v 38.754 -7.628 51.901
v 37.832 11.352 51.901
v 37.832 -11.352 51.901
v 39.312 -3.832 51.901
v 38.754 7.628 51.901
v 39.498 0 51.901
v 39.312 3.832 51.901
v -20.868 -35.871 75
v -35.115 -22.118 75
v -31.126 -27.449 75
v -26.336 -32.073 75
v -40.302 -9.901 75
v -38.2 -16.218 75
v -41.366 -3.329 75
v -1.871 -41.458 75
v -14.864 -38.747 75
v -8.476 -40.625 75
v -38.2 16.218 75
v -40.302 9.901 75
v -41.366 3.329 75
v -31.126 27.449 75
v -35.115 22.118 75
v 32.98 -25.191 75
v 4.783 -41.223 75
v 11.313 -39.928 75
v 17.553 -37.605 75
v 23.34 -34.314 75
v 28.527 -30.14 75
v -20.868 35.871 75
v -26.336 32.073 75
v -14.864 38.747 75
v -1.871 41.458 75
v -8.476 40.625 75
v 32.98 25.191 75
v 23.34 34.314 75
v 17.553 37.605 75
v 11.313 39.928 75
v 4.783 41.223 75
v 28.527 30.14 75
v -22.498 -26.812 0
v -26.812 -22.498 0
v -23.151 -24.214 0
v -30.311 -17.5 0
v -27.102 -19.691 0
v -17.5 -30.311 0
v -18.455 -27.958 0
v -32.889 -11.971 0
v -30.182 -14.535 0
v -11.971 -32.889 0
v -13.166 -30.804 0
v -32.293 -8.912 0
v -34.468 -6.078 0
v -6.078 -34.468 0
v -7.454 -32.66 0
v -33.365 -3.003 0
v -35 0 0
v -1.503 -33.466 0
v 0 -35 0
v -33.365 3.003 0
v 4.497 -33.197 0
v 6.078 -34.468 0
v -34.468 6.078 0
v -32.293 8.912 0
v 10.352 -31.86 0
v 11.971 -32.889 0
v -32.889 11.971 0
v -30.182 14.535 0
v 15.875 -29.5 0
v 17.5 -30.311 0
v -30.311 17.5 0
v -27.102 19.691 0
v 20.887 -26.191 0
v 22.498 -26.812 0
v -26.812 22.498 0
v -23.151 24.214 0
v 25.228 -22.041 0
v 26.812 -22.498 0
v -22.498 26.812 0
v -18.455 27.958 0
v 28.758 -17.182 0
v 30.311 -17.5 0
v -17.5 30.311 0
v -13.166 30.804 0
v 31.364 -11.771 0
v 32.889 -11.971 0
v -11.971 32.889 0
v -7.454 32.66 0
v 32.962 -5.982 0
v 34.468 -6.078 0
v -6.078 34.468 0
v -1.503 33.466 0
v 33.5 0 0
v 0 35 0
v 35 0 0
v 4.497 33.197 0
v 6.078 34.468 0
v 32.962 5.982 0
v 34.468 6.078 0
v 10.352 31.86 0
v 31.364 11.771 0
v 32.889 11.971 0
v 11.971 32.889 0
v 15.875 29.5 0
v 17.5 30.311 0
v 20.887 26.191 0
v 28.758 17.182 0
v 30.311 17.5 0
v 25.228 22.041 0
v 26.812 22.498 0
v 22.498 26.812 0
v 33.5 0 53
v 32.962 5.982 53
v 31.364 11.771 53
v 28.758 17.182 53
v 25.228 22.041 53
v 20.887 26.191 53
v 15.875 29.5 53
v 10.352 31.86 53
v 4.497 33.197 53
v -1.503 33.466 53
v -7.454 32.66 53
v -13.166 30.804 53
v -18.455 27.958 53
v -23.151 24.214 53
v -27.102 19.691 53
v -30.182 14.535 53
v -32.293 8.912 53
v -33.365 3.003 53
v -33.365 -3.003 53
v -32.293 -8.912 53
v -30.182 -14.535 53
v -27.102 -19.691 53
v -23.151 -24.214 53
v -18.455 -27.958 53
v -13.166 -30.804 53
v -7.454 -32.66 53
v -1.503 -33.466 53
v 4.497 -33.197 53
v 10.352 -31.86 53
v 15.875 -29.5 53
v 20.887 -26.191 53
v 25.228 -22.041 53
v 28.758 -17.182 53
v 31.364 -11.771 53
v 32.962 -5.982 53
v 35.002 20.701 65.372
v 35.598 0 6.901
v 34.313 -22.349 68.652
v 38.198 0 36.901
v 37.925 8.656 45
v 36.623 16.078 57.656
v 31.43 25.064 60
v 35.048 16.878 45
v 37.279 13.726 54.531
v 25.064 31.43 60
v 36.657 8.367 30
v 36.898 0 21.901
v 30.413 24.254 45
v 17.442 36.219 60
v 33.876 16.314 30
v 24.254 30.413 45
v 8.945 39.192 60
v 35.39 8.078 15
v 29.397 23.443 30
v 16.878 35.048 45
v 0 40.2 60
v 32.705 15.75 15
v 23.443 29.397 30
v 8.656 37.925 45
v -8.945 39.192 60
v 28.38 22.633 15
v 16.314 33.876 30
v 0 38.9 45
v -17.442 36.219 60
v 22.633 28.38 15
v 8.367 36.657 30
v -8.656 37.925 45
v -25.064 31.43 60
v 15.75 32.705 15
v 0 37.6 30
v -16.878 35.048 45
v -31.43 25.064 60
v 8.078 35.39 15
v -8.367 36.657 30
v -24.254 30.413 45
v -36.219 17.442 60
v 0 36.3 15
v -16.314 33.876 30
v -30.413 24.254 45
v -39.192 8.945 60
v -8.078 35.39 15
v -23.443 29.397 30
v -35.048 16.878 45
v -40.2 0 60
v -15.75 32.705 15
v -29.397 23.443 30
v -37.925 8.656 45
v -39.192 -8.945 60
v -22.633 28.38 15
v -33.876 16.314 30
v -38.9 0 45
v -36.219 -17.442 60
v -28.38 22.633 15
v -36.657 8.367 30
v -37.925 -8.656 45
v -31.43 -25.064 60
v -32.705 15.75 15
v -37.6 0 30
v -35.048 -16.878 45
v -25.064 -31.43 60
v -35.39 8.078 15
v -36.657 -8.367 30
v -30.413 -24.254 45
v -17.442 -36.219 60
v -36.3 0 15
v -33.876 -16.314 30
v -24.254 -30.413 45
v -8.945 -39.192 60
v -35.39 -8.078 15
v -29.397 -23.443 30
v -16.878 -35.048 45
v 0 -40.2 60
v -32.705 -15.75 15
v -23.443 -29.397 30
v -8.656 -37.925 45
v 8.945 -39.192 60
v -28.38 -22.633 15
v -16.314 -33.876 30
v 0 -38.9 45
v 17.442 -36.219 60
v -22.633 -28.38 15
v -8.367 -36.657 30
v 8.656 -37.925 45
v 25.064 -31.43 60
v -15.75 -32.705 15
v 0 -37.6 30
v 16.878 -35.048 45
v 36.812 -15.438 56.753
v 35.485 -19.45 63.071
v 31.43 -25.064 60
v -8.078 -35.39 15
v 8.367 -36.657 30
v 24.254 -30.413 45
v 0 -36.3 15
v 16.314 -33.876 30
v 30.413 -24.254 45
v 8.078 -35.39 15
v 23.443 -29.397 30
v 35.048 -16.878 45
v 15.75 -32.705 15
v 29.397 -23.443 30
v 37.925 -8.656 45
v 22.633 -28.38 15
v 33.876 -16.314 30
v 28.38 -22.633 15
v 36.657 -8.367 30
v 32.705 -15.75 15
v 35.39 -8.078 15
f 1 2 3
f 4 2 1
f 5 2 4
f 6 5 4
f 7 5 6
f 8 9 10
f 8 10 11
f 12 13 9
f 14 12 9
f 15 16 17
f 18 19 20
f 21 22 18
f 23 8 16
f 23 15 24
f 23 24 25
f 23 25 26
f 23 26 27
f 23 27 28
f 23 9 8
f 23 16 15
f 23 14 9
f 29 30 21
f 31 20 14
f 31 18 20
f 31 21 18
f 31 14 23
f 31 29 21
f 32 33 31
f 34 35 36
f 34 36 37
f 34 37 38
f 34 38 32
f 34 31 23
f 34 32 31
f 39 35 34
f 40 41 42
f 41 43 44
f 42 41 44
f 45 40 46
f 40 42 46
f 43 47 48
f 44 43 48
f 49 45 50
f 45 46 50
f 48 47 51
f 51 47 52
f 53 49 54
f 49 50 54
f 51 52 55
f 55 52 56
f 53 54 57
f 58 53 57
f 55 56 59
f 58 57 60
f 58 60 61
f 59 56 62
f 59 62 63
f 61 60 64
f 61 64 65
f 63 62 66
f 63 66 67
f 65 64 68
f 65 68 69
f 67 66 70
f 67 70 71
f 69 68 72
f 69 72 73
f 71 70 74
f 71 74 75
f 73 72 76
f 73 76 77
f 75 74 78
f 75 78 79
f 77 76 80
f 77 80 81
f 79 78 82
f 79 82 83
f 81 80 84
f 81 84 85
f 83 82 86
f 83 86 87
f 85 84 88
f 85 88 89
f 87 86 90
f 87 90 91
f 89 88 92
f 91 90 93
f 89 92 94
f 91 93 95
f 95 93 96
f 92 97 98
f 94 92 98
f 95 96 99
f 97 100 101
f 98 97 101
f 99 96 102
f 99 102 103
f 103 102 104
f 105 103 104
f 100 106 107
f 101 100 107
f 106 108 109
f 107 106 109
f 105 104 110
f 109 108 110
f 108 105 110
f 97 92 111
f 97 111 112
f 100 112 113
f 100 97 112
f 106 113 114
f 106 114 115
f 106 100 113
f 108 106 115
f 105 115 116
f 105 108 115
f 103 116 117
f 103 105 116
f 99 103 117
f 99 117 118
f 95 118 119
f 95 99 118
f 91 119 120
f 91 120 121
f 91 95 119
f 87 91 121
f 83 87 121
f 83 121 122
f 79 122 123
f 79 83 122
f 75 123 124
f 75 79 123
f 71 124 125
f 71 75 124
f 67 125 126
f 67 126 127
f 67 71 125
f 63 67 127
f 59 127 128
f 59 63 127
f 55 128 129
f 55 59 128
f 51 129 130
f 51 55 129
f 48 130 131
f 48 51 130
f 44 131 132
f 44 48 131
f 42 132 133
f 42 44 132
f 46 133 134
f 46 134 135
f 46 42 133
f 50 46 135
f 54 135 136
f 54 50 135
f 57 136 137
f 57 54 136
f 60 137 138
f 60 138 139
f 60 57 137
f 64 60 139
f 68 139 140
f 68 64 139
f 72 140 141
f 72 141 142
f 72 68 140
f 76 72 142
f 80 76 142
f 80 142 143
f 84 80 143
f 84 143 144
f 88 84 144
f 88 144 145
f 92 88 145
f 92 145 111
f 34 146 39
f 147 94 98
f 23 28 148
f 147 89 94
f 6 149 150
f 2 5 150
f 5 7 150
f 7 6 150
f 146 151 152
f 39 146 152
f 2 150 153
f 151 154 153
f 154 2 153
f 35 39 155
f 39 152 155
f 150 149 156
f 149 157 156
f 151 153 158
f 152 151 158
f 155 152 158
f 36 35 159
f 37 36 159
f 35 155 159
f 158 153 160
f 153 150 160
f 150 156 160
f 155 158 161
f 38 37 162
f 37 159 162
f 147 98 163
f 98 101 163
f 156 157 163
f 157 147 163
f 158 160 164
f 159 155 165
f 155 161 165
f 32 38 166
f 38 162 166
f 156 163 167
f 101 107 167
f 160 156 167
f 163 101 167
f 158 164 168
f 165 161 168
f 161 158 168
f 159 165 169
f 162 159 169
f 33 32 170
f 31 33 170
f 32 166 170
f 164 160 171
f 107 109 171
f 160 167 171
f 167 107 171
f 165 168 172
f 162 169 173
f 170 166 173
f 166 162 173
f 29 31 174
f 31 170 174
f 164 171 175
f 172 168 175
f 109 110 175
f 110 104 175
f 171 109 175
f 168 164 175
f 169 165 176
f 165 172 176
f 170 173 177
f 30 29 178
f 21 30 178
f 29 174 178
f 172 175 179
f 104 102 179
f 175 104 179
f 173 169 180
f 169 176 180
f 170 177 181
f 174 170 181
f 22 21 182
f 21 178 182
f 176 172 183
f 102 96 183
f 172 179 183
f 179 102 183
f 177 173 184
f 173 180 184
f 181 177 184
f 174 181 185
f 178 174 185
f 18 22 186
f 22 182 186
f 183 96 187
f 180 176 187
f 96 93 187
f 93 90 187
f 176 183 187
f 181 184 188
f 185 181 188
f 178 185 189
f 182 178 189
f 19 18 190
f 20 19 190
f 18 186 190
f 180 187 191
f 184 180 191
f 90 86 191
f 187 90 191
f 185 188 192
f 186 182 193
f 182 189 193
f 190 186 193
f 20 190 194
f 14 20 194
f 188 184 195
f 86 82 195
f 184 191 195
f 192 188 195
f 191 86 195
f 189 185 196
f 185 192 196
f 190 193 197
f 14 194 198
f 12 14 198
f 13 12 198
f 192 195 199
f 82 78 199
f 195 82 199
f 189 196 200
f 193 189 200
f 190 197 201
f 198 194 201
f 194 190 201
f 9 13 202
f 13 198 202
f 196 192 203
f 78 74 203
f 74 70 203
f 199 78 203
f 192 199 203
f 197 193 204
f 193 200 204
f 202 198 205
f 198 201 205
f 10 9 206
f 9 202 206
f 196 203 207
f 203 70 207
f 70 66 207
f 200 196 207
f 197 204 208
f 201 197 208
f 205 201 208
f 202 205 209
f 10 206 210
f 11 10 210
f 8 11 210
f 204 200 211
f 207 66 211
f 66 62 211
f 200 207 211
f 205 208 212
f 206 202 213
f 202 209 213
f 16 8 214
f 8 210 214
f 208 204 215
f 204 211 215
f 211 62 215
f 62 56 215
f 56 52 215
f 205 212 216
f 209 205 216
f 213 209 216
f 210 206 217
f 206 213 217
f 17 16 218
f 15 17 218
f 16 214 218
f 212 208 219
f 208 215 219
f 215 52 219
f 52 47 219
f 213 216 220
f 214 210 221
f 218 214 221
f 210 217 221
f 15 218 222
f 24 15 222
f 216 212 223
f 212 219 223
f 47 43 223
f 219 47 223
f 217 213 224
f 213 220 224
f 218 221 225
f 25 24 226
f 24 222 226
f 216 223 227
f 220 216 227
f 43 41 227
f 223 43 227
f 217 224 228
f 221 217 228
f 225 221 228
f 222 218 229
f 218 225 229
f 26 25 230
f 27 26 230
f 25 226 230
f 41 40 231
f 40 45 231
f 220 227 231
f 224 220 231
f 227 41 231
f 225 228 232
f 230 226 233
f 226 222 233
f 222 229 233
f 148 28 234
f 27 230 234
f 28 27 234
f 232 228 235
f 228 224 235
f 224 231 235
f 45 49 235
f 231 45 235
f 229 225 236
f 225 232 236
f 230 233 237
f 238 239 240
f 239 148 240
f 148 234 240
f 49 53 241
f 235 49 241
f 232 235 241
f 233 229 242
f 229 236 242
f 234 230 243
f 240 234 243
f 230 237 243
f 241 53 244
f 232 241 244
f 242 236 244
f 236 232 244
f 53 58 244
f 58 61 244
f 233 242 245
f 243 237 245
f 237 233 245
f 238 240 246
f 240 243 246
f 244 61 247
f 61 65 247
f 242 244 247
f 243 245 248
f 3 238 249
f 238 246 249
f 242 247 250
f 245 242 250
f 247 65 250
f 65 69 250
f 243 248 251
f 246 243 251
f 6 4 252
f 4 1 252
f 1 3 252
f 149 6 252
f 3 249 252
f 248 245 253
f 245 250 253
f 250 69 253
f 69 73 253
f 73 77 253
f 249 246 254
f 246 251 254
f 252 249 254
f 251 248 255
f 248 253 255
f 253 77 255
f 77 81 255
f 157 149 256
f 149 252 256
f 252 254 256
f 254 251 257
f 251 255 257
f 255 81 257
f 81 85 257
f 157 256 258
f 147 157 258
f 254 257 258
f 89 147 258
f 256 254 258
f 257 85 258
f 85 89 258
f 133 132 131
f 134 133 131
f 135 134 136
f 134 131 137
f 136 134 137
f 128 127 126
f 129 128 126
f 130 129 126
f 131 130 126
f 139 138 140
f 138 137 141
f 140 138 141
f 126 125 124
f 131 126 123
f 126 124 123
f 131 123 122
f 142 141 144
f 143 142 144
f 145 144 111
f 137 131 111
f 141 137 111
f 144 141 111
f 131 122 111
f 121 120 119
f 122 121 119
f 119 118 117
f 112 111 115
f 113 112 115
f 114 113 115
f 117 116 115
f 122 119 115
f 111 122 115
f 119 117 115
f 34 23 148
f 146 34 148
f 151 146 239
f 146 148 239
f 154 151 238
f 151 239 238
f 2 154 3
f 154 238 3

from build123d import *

# Parameters (mm, degrees)
F2_R     = 41.5
F0_R     = 35
F6_DEPTH = 27.5
F7_R     = 33.5
F8_DEPTH = 53


with BuildPart() as f3:
    # F2 (on offset) → F3 section 0
    with BuildSketch(Plane.XY.offset(75)):
        Circle(F2_R)
    # F0 (on Top) → F3 section 1
    with BuildSketch(Plane.XY):
        Circle(F0_R)
    loft()

    # F5 (on Front) → F6 (cut, symmetric)
    with BuildSketch(Plane.XZ):
        Polygon((32.979961, 75), (37.831545, 51.901187), (40.54823, 51.901187), (42.30484, 75), align=None)
    extrude(amount=F6_DEPTH, both=True, mode=Mode.SUBTRACT)

    # F7 (on Top) → F8 (cut)
    with BuildSketch(Plane.XY):
        Circle(F7_R)
    extrude(amount=F8_DEPTH, mode=Mode.SUBTRACT)


solid = f3.part
